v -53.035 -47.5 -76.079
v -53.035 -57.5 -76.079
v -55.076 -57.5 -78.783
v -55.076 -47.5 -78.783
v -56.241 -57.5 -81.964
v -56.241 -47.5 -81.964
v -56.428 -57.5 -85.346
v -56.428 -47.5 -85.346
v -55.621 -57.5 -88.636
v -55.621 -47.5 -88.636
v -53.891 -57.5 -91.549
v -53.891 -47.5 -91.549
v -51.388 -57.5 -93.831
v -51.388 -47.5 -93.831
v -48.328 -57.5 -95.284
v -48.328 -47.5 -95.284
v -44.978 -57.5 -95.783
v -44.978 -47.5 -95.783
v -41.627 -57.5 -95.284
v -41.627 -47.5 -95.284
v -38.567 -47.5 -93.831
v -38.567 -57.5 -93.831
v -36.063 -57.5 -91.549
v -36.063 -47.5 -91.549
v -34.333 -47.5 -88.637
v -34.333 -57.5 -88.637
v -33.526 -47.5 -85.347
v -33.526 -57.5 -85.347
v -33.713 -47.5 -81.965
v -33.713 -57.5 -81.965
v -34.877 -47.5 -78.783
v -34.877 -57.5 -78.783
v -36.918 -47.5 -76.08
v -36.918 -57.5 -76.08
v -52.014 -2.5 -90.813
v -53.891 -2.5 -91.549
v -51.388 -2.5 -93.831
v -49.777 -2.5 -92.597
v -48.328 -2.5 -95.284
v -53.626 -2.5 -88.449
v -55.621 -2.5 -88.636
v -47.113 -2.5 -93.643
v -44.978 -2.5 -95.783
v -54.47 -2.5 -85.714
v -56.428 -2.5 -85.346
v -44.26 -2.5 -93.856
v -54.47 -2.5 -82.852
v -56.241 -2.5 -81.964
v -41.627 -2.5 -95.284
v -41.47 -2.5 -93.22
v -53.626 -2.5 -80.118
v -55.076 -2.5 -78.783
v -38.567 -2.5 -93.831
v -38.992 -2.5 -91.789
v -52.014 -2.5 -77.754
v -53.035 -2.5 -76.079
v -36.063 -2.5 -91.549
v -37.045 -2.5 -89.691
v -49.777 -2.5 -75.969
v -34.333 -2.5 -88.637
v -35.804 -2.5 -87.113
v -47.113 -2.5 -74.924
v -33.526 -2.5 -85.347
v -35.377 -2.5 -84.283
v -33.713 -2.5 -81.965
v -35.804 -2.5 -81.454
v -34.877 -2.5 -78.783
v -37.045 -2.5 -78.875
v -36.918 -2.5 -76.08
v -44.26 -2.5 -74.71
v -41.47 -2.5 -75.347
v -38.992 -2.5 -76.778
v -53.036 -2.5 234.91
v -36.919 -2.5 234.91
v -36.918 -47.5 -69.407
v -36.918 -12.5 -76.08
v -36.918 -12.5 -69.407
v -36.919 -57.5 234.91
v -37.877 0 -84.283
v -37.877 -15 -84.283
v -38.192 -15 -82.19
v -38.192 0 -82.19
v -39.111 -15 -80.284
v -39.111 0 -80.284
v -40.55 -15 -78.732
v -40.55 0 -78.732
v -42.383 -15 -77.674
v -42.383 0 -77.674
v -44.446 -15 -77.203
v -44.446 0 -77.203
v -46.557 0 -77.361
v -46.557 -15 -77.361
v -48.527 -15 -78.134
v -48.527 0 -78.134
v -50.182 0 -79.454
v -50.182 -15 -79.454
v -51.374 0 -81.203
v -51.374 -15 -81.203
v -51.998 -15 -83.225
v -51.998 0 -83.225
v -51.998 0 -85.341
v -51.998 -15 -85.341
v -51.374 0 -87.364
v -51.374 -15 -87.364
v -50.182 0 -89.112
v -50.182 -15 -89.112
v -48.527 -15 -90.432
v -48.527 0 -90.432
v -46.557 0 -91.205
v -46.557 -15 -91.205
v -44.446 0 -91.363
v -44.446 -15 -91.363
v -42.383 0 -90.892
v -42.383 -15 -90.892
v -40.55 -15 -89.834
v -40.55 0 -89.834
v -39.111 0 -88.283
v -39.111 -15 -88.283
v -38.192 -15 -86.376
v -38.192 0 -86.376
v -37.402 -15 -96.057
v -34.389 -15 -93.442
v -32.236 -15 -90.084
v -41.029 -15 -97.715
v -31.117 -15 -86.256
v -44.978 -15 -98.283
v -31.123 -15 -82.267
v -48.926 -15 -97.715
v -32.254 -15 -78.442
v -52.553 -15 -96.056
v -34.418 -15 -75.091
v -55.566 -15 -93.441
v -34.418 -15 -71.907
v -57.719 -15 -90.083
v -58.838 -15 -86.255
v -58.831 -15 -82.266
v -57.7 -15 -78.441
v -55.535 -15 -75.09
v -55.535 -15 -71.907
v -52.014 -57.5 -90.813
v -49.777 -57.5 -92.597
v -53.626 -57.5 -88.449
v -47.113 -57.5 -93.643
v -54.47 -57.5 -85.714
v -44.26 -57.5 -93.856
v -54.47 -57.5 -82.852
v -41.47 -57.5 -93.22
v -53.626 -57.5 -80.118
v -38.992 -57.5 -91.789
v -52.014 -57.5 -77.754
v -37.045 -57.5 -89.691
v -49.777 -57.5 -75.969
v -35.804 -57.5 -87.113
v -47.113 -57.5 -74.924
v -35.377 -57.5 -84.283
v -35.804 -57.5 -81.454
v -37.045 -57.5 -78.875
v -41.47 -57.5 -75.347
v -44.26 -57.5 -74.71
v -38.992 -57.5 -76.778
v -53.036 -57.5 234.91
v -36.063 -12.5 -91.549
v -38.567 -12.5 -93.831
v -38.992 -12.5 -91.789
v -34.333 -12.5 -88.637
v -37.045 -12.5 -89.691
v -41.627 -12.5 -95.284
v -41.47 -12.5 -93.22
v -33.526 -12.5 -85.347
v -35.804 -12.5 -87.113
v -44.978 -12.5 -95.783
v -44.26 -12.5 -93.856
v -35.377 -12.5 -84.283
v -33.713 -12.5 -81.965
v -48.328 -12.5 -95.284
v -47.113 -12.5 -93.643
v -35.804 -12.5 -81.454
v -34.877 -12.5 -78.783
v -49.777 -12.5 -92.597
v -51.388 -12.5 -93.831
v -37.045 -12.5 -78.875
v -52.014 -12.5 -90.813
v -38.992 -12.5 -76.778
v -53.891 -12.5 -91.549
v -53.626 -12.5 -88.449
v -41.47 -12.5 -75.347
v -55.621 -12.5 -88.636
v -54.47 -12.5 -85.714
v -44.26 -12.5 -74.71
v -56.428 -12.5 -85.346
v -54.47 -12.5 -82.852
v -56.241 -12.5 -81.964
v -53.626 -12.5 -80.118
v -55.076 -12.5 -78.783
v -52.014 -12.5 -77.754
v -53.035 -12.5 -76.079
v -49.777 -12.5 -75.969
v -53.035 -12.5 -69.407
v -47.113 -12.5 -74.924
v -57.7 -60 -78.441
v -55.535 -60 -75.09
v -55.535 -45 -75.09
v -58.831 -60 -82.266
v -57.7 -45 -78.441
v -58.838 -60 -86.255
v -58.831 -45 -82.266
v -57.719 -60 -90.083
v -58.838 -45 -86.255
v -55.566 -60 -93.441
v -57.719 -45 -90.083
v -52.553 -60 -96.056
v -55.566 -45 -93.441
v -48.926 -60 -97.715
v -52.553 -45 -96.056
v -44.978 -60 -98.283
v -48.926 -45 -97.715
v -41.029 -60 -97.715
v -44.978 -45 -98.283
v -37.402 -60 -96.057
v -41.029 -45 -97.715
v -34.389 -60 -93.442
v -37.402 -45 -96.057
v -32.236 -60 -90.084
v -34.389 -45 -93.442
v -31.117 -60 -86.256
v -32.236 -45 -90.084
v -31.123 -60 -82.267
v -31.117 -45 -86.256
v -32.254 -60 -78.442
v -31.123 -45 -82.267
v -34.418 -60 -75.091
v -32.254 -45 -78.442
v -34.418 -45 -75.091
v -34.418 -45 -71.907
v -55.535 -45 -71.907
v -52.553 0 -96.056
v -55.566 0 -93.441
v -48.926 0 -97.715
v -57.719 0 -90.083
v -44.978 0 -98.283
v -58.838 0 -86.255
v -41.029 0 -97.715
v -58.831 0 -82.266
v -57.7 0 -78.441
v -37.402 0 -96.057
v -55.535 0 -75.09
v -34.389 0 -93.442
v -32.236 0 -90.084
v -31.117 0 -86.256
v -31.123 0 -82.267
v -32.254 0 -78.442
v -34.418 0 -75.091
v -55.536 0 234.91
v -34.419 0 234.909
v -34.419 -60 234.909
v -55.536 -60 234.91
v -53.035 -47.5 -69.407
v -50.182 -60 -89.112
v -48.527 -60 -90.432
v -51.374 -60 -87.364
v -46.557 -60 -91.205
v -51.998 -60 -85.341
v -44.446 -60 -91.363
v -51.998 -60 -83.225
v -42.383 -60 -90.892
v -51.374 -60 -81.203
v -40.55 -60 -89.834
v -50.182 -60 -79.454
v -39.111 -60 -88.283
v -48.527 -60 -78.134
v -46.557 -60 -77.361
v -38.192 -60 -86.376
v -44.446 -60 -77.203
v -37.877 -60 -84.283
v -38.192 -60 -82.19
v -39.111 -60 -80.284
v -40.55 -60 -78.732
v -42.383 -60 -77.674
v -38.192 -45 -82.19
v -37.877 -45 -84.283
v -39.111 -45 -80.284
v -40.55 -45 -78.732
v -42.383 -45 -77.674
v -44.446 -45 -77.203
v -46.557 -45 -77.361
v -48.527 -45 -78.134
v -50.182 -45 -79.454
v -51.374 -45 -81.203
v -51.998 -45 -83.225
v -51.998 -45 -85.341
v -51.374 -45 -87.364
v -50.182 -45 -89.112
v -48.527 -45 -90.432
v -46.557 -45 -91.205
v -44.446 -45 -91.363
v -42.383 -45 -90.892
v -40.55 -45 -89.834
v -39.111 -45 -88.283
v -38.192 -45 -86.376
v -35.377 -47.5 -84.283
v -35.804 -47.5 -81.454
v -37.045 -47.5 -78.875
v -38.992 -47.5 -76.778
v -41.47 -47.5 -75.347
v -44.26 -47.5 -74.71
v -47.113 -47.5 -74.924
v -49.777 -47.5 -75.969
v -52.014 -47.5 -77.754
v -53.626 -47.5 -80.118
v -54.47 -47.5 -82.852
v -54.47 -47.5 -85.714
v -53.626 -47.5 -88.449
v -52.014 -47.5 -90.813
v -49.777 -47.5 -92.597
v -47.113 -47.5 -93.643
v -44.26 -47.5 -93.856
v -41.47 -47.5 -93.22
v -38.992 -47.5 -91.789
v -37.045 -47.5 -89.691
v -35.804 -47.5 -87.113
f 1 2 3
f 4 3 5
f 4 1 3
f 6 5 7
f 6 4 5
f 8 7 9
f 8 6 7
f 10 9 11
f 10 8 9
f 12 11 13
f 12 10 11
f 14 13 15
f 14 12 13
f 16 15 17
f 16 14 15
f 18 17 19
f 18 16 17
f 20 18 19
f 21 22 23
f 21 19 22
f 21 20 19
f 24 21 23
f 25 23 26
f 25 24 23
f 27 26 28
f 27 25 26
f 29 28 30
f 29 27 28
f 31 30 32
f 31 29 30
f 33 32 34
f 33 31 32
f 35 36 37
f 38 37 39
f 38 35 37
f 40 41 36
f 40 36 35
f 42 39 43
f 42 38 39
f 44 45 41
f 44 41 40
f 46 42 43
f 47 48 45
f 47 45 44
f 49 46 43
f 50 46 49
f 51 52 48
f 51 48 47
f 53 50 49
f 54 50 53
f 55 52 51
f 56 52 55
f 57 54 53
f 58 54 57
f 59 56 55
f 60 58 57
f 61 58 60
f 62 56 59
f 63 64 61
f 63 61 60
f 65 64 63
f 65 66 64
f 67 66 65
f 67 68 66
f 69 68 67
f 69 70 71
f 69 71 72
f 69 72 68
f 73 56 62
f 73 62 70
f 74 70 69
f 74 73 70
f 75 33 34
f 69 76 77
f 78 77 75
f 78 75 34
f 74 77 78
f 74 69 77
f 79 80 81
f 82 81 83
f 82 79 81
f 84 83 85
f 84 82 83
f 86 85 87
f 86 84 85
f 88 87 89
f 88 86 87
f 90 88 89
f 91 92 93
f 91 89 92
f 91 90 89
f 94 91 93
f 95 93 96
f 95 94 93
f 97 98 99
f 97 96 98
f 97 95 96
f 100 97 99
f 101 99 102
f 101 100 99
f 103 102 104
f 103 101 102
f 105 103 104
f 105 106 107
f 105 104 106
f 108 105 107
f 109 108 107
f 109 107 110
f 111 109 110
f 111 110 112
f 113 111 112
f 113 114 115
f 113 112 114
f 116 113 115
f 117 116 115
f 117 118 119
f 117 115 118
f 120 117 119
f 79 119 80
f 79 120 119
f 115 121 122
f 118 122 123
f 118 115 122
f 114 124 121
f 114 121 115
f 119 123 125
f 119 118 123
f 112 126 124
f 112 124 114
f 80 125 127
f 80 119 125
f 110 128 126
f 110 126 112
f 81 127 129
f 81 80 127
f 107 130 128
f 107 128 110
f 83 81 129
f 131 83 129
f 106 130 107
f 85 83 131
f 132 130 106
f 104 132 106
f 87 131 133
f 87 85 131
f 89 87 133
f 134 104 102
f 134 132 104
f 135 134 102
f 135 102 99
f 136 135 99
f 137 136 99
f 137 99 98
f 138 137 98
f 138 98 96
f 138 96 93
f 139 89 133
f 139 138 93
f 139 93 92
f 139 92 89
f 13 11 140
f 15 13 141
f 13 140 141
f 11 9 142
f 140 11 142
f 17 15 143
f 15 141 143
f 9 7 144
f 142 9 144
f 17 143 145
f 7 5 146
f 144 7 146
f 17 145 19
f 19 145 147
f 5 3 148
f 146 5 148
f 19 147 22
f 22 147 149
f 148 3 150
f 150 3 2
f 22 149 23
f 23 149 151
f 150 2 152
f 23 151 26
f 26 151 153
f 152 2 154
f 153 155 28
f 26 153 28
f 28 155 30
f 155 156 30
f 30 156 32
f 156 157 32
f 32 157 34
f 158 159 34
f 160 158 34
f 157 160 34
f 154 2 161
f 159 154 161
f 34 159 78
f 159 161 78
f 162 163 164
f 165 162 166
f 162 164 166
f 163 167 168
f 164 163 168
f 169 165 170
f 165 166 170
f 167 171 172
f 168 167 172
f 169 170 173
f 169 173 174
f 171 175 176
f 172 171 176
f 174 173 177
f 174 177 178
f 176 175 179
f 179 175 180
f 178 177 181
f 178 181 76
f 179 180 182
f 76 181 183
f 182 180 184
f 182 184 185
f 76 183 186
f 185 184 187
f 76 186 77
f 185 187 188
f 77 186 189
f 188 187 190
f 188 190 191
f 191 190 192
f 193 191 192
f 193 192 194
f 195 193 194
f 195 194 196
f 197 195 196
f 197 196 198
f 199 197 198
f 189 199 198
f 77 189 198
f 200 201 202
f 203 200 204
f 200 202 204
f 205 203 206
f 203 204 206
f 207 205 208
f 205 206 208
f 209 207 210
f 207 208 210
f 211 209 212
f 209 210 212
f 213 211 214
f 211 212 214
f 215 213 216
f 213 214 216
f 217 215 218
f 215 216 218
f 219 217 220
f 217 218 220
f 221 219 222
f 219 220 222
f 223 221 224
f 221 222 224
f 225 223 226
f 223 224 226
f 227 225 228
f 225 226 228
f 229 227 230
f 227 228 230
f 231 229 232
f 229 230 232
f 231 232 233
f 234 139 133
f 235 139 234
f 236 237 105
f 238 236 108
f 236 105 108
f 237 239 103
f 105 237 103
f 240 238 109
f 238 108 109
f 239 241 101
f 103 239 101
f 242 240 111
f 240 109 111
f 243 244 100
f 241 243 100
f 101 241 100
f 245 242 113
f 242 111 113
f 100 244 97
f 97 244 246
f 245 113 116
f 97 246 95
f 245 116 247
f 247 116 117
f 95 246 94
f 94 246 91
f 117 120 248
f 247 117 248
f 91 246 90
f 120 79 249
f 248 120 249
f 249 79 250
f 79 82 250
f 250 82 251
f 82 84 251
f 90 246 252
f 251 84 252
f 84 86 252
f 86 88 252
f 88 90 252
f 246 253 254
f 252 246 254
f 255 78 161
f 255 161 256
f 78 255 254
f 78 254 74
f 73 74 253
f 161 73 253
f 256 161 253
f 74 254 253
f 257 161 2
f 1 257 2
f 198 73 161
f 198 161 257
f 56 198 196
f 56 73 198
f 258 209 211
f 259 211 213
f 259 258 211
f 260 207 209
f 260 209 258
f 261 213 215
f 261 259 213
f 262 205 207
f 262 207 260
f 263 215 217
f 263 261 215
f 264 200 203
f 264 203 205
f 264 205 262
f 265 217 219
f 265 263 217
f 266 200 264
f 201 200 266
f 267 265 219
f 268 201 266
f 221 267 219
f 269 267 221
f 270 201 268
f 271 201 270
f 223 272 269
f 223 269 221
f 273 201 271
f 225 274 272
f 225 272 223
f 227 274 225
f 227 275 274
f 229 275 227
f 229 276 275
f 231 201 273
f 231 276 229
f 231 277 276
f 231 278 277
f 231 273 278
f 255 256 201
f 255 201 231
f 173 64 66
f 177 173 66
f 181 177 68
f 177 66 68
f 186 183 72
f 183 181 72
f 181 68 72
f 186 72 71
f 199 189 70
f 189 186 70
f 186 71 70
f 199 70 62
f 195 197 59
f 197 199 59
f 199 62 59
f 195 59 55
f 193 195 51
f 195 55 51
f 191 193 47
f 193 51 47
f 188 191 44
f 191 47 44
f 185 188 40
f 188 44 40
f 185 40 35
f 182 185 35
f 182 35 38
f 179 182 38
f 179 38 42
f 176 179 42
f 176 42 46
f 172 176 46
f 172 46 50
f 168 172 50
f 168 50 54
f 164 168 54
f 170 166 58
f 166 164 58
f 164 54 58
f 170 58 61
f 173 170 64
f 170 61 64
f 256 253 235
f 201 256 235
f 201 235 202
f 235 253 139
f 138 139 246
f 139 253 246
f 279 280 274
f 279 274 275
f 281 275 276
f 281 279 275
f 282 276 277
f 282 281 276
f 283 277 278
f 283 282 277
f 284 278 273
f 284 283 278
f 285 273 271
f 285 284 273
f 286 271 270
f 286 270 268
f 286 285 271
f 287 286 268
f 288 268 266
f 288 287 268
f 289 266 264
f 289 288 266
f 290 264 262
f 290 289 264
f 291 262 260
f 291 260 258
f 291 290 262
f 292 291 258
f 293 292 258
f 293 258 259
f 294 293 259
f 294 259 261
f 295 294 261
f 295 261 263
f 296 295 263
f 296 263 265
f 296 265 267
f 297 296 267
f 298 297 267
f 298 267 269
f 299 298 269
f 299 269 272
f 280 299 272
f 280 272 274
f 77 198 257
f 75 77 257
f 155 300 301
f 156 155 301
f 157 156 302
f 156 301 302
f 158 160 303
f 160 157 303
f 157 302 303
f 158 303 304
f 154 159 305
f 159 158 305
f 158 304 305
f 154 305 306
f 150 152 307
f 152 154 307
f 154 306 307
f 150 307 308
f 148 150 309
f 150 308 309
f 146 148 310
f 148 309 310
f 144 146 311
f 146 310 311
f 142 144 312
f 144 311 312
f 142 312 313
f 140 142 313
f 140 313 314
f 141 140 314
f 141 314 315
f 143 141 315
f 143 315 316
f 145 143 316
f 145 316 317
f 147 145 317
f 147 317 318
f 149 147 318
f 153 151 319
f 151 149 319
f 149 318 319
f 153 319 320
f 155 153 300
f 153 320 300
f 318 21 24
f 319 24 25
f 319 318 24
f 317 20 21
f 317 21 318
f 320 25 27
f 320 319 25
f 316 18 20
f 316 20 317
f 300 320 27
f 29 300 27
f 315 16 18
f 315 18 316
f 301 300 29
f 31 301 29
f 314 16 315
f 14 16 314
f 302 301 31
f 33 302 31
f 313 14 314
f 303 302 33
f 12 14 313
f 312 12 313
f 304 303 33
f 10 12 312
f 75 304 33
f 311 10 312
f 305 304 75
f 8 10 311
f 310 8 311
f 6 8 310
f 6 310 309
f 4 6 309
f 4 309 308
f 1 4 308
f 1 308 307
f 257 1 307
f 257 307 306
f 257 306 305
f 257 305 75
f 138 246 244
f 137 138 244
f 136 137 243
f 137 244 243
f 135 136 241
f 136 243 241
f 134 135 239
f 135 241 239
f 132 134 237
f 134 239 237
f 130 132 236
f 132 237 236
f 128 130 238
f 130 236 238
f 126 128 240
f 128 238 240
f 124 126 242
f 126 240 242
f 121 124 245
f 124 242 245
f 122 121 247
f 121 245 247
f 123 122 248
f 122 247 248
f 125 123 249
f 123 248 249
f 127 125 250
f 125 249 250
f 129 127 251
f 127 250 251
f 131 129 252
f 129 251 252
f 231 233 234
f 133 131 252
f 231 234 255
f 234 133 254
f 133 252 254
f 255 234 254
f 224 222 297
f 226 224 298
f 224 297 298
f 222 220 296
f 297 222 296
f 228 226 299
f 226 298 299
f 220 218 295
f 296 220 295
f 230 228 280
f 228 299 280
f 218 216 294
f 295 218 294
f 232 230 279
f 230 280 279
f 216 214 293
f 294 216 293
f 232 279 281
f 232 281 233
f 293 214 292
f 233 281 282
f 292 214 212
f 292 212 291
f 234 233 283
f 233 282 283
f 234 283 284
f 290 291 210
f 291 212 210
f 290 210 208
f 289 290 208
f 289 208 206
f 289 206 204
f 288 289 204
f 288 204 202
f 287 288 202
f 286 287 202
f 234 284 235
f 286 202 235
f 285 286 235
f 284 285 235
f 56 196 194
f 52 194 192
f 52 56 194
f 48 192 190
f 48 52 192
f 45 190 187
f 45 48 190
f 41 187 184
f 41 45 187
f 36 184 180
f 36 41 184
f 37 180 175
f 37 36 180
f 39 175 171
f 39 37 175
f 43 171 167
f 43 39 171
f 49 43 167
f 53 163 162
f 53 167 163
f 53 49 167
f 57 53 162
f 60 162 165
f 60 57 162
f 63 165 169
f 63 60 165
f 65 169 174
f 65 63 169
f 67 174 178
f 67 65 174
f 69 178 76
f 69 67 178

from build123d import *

# Parameters (mm, degrees)
F0_R          = 7.1
F1_DEPTH      = 60
F2_W          = 30
F2_H          = 32.2353386643
F3_DEPTH      = 25
F3_DEPTH_BACK = 25
F4_T          = -2.5


with BuildPart() as f1:
    # F0 (on Front) → F1 (new body)
    with BuildSketch(Plane.XZ):
        with BuildLine():
            Line((-55.5361600815, 234.910292219), (-55.535415078, -75.0897077801))
            ThreePointArc((-55.535415078, -75.0897077801), (-44.9776062474, -98.283221459), (-34.4179178598, -75.0905634563))
            Line((-34.4179178598, -75.0905634563), (-34.4186628633, 234.9094365428))
            Line((-34.4186628633, 234.9094365428), (-55.5361600815, 234.910292219))
        make_face()
        with Locations((-44.9770389706, -84.2832214705)):
            Circle(F0_R, mode=Mode.SUBTRACT)
    extrude(amount=F1_DEPTH)

    # F2 (on face) → F3 (cut, two sides)
    with BuildSketch(Plane(origin=(-55.535595536, 0, -0.0001334652), x_dir=(0, -1, 0), z_dir=(-1, 0, -2.4032e-06))) as f3_sk:
        with Locations((30, -88.0241336473)):
            Rectangle(F2_W, F2_H)
    extrude(amount=-F3_DEPTH, mode=Mode.SUBTRACT)
    extrude(f3_sk.sketch, amount=F3_DEPTH_BACK, mode=Mode.SUBTRACT)

    # F4
    f4_openings = [f1.faces().sort_by_distance(p)[0] for p in [
        (-44.977411, -30, 234.909864),
    ]]
    offset(amount=F4_T, openings=f4_openings, kind=Kind.INTERSECTION)


solid = f1.part
